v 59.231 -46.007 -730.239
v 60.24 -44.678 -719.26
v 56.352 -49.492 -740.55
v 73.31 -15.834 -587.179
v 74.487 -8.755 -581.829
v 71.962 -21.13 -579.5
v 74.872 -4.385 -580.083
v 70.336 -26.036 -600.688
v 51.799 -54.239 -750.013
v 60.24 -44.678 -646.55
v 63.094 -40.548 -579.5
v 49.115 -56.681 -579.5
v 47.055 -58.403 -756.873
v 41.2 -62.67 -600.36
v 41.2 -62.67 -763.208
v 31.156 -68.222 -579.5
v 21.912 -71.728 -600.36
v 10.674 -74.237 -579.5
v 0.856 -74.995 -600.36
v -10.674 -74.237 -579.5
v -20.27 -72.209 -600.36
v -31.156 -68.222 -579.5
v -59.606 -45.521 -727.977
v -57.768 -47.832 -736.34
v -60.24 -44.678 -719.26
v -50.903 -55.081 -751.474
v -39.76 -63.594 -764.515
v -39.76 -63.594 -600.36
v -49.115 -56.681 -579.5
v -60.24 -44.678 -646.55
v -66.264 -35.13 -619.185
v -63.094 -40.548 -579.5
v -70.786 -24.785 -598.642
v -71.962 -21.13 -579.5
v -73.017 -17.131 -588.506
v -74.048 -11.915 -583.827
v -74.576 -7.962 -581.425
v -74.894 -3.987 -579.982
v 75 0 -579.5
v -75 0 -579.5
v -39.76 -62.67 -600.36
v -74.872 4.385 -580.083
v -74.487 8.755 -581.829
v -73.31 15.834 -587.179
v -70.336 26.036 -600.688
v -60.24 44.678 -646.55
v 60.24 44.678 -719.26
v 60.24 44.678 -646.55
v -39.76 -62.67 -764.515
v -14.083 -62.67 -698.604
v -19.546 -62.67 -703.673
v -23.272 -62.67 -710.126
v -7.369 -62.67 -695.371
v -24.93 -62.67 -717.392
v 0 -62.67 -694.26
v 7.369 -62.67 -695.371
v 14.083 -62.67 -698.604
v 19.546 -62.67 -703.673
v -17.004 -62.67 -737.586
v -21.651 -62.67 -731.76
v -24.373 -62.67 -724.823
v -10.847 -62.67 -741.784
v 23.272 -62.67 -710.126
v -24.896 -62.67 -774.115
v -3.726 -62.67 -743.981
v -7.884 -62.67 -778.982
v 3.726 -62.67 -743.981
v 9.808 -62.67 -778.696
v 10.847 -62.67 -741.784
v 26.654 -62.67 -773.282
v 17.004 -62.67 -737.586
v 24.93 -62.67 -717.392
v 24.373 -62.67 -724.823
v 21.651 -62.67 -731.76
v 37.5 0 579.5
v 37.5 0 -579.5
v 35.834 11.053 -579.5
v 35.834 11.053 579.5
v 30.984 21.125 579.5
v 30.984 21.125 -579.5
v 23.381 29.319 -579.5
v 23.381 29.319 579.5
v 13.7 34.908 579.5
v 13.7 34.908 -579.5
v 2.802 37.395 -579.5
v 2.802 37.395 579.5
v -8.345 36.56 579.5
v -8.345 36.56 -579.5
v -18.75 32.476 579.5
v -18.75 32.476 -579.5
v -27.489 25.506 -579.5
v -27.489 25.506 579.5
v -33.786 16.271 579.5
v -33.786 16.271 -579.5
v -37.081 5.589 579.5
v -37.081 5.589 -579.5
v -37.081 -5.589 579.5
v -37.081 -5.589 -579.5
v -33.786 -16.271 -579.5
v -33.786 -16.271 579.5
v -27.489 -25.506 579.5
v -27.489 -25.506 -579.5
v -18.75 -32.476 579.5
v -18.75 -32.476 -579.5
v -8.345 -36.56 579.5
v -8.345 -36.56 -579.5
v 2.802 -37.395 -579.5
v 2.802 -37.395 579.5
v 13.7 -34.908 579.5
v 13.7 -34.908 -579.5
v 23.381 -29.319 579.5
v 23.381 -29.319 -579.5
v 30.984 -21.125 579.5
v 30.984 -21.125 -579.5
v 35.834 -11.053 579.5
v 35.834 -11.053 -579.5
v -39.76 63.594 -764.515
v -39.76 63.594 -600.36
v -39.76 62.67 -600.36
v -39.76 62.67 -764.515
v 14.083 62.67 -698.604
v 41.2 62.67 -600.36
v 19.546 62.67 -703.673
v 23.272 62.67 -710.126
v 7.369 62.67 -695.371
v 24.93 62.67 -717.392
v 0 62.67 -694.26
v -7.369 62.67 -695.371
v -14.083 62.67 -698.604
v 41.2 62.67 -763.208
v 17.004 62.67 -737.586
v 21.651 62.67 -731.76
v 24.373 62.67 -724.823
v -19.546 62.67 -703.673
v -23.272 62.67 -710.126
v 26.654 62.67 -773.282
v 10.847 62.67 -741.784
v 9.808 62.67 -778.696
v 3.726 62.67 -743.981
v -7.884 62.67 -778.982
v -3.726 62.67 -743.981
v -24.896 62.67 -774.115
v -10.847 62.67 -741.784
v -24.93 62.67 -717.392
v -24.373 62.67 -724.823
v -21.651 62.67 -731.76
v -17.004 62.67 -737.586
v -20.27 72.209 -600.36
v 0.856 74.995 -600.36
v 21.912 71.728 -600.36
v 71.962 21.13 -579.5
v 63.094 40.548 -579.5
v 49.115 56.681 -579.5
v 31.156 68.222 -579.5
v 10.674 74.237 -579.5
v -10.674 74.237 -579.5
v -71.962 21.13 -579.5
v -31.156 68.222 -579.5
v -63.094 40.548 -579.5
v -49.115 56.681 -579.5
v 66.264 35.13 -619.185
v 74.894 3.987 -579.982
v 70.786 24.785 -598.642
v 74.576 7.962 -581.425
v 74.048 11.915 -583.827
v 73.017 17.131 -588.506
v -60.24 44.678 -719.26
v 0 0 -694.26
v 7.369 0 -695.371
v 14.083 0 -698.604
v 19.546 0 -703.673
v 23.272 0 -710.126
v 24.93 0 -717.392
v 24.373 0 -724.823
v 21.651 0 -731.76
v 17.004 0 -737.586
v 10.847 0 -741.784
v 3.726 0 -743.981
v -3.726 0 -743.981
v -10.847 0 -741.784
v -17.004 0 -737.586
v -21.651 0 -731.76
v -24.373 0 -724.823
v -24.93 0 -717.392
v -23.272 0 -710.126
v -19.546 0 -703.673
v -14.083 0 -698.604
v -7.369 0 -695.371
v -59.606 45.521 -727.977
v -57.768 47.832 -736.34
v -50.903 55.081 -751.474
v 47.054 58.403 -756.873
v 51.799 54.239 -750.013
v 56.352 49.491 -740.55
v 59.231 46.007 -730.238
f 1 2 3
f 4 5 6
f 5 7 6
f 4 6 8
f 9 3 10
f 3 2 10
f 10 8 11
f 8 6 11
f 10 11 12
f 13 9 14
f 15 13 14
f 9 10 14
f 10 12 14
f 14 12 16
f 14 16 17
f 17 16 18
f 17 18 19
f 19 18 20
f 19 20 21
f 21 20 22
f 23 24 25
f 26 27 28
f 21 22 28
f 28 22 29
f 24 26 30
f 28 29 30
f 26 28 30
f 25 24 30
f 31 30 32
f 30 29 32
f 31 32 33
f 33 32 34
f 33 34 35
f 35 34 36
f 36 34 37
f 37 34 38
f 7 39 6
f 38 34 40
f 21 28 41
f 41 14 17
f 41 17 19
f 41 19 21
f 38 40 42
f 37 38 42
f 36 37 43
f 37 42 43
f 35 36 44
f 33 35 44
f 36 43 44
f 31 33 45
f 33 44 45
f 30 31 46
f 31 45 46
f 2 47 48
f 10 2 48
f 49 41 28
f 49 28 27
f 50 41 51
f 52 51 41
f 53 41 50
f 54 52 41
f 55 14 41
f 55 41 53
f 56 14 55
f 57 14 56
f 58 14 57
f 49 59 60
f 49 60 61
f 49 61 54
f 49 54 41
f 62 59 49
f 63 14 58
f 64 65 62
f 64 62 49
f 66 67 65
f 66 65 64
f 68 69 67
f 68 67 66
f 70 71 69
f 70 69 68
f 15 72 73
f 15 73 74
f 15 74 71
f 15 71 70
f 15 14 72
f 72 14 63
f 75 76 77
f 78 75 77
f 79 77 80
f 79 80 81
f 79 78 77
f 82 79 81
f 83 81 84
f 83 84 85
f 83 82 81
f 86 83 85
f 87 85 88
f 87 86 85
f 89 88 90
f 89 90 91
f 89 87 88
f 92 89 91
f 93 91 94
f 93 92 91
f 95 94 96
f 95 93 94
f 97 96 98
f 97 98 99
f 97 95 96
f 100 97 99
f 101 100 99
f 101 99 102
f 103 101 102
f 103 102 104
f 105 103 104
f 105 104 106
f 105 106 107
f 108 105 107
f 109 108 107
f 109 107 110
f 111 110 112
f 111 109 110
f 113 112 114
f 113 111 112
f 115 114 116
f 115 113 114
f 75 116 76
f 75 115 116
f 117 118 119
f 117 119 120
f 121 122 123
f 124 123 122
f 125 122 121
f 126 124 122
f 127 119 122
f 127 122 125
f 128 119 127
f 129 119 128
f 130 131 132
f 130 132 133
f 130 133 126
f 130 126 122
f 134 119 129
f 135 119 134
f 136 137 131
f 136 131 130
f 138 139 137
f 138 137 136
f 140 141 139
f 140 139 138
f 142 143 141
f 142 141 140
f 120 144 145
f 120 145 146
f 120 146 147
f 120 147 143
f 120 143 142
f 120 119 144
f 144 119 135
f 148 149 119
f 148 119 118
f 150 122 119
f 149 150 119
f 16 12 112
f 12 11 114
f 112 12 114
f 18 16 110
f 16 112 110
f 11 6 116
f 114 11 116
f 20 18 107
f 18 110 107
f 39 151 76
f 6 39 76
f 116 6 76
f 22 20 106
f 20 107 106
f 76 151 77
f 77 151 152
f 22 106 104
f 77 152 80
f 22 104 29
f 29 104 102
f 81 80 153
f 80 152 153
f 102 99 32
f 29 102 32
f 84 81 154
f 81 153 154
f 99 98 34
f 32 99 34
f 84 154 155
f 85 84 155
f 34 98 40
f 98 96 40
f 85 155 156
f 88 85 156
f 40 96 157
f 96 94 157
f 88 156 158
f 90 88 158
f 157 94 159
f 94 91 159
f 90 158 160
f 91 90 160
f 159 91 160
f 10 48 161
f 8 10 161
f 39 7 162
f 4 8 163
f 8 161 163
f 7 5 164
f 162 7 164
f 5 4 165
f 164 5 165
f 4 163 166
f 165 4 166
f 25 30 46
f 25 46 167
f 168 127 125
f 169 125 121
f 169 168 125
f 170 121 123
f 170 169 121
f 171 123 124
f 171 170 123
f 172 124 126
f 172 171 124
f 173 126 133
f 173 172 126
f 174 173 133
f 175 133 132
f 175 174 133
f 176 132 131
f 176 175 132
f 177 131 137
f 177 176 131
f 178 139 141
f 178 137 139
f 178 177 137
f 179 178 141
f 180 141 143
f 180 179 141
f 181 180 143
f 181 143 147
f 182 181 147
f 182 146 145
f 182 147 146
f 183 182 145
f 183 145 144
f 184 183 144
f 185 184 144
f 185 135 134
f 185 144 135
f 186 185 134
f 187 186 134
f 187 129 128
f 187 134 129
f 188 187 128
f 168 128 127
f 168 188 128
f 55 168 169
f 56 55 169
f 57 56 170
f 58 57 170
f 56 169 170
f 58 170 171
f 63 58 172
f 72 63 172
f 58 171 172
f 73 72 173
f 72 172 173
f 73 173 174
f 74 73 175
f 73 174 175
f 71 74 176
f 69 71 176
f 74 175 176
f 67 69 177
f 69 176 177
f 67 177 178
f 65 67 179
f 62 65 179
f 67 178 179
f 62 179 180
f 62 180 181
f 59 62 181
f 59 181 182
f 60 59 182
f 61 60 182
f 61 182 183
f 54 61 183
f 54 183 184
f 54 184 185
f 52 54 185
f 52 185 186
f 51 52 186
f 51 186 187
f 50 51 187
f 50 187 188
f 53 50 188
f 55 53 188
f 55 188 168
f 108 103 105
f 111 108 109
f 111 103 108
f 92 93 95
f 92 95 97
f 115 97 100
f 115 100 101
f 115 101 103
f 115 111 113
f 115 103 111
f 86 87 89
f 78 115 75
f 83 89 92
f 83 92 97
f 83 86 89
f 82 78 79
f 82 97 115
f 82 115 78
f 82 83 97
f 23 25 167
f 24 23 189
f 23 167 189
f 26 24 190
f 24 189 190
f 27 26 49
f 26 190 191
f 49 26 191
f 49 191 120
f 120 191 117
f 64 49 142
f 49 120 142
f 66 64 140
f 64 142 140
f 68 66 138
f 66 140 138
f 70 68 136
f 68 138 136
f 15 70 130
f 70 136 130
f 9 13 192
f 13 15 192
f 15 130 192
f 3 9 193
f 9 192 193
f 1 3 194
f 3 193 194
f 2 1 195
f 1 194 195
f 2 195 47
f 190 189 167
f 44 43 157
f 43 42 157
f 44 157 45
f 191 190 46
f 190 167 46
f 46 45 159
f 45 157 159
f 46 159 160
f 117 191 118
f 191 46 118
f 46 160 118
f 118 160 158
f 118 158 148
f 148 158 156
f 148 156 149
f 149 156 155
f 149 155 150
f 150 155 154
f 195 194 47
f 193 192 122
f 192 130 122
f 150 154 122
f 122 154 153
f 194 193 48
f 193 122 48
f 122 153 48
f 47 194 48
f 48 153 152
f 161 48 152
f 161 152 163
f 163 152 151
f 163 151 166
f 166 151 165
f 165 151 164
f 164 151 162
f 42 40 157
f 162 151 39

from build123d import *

# Parameters (mm, degrees)
SKETCH1_R           = 37.5
BOSS_EXTRUDE1_DEPTH = 579.5
SKETCH2_R           = 75
BOSS_EXTRUDE2_DEPTH = 200
SKETCH3_R           = 25
CUT_EXTRUDE1_DEPTH  = 100
SKETCH4_W           = 260.945871841
SKETCH4_H           = 75.746474917
CUT_EXTRUDE2_DEPTH  = 100


with BuildPart() as part:
    # Sketch1 → Boss-Extrude1 (new, symmetric)
    with BuildSketch(Plane.XY):
        Circle(SKETCH1_R)
    extrude(amount=BOSS_EXTRUDE1_DEPTH, both=True)

    # Sketch2 → Boss-Extrude2 (add)
    with BuildSketch(Plane(origin=(0, 0, -579.5), x_dir=(-1, 0, 0), z_dir=(0, 0, -1))):
        Circle(SKETCH2_R)
    extrude(amount=BOSS_EXTRUDE2_DEPTH)

    # Sketch3 → Cut-Extrude1 (cut, symmetric)
    with BuildSketch(Plane(origin=(0, 0, 0), x_dir=(1, 0, 0), z_dir=(0, 1, 0))):
        with Locations(Location((0, 719.26, 0), (0, 0, 270))):
            Circle(SKETCH3_R)
        with BuildLine():
            Line((60.24, 719.26), (60.24, 646.55))
            Line((60.24, 646.55), (75, 579.5))
            Line((75, 579.5), (150.12522471, 579.5))
            Line((150.12522471, 579.5), (155.105572786, 831.544185687))
            Line((155.105572786, 831.544185687), (-155.801518438, 837.687654259))
            Line((-155.801518438, 837.687654259), (-75, 579.5))
            Line((-75, 579.5), (-60.24, 646.55))
            Line((-60.24, 646.55), (-60.24, 719.26))
            ThreePointArc((-60.24, 719.26), (0, 779.5), (60.24, 719.26))
        make_face()
    extrude(amount=CUT_EXTRUDE1_DEPTH, both=True, mode=Mode.SUBTRACT)

    # Sketch4 → Cut-Extrude2 (cut, symmetric)
    with BuildSketch(Plane(origin=(60.24, 0, 0), x_dir=(0, 0, -1), z_dir=(1, 0, 0))):
        with Locations((730.83293592, 100.543237459)):
            Rectangle(SKETCH4_W, SKETCH4_H)
        with Locations((730.83293592, -100.543237459)):
            Rectangle(SKETCH4_W, SKETCH4_H)
    extrude(amount=CUT_EXTRUDE2_DEPTH, both=True, mode=Mode.SUBTRACT)


solid = part.part
